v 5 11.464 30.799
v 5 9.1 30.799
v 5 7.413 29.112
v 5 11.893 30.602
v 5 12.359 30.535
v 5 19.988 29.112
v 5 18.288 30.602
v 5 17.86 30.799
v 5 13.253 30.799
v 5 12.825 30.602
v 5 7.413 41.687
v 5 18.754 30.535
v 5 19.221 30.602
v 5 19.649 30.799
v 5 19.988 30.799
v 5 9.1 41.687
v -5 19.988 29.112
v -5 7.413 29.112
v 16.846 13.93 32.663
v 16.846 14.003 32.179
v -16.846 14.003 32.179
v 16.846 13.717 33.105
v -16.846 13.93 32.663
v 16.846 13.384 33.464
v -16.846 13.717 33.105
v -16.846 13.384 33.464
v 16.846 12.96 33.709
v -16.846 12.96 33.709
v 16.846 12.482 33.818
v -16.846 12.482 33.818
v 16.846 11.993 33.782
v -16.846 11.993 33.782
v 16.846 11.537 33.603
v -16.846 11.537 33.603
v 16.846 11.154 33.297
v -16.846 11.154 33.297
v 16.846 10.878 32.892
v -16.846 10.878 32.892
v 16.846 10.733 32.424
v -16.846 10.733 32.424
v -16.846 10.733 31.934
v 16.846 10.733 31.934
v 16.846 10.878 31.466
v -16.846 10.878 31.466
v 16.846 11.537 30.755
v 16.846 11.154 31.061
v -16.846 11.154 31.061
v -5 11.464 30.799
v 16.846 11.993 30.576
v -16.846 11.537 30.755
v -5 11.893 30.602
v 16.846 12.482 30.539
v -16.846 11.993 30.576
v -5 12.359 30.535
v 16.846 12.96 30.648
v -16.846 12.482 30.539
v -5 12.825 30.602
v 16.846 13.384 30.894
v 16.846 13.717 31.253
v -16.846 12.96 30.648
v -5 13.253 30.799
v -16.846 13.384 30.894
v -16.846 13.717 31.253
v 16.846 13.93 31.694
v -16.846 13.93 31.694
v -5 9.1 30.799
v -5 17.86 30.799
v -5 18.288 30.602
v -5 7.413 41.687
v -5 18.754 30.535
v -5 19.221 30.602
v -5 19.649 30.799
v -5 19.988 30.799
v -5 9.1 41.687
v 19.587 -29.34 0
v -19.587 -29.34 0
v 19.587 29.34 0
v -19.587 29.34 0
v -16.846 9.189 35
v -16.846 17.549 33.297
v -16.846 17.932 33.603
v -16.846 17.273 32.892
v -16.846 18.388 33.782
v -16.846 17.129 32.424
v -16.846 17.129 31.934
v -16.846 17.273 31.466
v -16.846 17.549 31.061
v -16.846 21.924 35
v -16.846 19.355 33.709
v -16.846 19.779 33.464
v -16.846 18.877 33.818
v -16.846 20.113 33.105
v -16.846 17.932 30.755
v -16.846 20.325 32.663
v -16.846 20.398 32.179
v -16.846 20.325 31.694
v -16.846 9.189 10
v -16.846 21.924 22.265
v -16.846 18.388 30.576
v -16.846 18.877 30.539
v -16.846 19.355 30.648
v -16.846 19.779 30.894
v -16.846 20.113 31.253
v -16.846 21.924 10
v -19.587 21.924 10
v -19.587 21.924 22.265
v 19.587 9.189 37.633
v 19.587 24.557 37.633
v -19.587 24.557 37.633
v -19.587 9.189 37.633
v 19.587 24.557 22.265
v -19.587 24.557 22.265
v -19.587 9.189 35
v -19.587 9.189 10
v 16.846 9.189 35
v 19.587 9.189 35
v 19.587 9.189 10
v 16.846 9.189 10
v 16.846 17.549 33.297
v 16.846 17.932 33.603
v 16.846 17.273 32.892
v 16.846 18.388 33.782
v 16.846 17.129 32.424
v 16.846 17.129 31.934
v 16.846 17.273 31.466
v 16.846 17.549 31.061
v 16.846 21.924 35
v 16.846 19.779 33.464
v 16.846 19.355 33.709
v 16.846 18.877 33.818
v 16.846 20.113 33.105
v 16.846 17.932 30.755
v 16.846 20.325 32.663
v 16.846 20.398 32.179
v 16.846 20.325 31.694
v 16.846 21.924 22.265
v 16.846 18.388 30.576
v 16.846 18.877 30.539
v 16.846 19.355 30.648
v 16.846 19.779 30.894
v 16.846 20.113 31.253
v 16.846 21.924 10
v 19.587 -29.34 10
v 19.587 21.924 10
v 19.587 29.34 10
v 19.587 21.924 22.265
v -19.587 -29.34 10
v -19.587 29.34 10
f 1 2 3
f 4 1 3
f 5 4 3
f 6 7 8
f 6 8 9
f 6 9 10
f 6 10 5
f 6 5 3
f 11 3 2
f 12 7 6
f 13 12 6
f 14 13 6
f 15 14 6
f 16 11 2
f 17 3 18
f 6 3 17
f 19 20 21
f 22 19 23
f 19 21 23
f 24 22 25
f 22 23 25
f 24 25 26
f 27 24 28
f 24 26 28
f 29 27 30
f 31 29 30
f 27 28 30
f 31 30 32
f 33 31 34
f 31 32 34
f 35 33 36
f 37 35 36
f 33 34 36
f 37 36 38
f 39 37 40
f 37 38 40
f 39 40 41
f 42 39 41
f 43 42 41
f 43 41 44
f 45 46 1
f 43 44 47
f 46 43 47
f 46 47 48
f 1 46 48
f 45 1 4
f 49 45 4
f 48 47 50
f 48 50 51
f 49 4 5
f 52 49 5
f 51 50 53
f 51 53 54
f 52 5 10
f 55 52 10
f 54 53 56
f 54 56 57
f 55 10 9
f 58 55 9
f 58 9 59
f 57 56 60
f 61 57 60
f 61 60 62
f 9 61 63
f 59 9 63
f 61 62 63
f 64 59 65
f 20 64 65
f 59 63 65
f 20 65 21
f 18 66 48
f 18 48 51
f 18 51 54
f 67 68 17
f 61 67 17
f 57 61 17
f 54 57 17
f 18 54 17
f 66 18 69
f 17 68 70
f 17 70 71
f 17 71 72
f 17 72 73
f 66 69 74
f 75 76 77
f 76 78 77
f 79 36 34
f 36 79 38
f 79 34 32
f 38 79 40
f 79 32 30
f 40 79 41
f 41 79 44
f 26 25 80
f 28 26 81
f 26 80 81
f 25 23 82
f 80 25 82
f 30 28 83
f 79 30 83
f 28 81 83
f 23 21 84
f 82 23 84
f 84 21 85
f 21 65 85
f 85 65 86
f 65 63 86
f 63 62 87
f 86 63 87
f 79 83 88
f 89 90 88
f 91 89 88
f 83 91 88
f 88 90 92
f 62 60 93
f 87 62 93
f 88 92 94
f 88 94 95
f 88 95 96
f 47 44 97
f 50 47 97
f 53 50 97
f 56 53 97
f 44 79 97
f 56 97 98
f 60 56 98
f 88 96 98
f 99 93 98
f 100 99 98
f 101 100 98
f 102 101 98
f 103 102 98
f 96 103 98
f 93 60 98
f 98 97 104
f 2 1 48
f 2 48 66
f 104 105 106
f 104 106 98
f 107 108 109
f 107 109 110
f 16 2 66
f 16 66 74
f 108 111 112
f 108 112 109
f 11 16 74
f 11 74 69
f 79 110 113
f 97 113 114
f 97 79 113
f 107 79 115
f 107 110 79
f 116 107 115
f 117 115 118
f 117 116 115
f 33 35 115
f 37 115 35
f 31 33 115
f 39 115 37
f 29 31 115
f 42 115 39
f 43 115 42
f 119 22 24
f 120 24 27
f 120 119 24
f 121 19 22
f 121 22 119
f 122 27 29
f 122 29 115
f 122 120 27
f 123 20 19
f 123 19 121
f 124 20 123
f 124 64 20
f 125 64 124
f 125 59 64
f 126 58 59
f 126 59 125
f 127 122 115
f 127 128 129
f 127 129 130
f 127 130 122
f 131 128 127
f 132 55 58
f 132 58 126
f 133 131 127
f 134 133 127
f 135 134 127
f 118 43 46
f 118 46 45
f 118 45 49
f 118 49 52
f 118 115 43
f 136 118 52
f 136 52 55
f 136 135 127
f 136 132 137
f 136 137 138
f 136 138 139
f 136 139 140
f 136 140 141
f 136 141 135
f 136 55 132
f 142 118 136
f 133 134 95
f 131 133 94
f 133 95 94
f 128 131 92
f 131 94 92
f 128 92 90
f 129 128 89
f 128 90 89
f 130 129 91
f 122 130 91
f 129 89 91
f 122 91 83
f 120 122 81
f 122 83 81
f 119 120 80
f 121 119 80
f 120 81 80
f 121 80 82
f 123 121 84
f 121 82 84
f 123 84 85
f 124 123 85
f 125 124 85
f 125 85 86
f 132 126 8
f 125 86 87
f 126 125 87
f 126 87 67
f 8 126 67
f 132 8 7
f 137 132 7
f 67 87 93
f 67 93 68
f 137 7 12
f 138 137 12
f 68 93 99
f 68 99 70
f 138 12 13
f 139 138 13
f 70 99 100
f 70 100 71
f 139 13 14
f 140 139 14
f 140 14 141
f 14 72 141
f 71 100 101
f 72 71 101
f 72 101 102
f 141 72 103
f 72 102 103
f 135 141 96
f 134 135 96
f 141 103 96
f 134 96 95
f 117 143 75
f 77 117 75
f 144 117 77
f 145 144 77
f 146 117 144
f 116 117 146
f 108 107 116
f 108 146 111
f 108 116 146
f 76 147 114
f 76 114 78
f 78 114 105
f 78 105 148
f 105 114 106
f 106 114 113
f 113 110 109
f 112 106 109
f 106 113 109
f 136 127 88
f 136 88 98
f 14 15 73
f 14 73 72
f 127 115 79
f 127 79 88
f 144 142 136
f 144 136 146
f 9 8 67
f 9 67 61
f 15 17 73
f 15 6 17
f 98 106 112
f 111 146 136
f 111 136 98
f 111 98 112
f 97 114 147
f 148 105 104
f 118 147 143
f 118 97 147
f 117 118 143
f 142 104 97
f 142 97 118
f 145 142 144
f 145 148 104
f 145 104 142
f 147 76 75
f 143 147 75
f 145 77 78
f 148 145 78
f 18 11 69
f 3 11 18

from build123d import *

# Parameters (mm, degrees)
F0_W     = 2.7405302972
F0_H     = 12.7354152501
F1_DEPTH = 10
F2_DEPTH = 35
F3_R     = 1.6440039884
F4_DEPTH = 33.6924307048
F6_DEPTH = 39.1734912992
F8_DEPTH = 5


with BuildPart() as f1:
    # F0 (on Top) → F1 (new body)
    with BuildSketch(Plane.XY):
        Polygon((19.5867456496, 29.3398164213), (-19.5867456496, 29.3398164213), (-19.5867456496, 21.9242591411), (-16.8462153524, 21.9242591411), (-16.8462153524, 9.188843891), (-19.5867456496, 9.188843891), (-19.5867456496, -29.3398164213), (19.5867456496, -29.3398164213), (19.5867456496, 9.188843891), (16.8462153524, 9.188843891), (16.8462153524, 21.9242591411), (19.5867456496, 21.9242591411), align=None)
        with Locations((-18.216480501, 15.5565515161)):
            Rectangle(F0_W, F0_H)
        with Locations((18.216480501, 15.5565515161)):
            Rectangle(F0_W, F0_H)
    extrude(amount=F1_DEPTH)

    # F0 (on Top) → F2 (join)
    with BuildSketch(Plane.XY):
        with Locations((-18.216480501, 15.5565515161)):
            Rectangle(F0_W, F0_H)
        with Locations((18.216480501, 15.5565515161)):
            Rectangle(F0_W, F0_H)
    extrude(amount=F2_DEPTH)

    # F3 (on face) → F4 (join, through all)
    with BuildSketch(Plane.YZ.offset(-16.8462153524)):
        with Locations((12.3588815841, 32.1788525892)):
            Circle(F3_R)
        with Locations((18.754221448, 32.1788525892)):
            Circle(F3_R)
    extrude(amount=F4_DEPTH)

    # F5 (on face) → F6 (join, through all)
    with BuildSketch(Plane.YZ.offset(19.5867456496)):
        Polygon((9.188843891, 37.6330949366), (9.188843891, 35), (21.9242591411, 35), (21.9242591411, 22.2645847499), (24.5573540777, 22.2645847499), (24.5573540777, 37.6330949366), align=None)
    extrude(amount=-F6_DEPTH)

    # F7 (on Right) → F8 (join, symmetric)
    with BuildSketch(Plane.YZ):
        Polygon((19.9882956222, 29.1119106114), (19.9882956222, 30.7994605973), (9.100439027, 30.7994605973), (9.100439027, 41.6873171926), (7.412889041, 41.6873171926), (7.412889041, 29.1119106114), align=None)
    extrude(amount=F8_DEPTH, both=True)


solid = f1.part
